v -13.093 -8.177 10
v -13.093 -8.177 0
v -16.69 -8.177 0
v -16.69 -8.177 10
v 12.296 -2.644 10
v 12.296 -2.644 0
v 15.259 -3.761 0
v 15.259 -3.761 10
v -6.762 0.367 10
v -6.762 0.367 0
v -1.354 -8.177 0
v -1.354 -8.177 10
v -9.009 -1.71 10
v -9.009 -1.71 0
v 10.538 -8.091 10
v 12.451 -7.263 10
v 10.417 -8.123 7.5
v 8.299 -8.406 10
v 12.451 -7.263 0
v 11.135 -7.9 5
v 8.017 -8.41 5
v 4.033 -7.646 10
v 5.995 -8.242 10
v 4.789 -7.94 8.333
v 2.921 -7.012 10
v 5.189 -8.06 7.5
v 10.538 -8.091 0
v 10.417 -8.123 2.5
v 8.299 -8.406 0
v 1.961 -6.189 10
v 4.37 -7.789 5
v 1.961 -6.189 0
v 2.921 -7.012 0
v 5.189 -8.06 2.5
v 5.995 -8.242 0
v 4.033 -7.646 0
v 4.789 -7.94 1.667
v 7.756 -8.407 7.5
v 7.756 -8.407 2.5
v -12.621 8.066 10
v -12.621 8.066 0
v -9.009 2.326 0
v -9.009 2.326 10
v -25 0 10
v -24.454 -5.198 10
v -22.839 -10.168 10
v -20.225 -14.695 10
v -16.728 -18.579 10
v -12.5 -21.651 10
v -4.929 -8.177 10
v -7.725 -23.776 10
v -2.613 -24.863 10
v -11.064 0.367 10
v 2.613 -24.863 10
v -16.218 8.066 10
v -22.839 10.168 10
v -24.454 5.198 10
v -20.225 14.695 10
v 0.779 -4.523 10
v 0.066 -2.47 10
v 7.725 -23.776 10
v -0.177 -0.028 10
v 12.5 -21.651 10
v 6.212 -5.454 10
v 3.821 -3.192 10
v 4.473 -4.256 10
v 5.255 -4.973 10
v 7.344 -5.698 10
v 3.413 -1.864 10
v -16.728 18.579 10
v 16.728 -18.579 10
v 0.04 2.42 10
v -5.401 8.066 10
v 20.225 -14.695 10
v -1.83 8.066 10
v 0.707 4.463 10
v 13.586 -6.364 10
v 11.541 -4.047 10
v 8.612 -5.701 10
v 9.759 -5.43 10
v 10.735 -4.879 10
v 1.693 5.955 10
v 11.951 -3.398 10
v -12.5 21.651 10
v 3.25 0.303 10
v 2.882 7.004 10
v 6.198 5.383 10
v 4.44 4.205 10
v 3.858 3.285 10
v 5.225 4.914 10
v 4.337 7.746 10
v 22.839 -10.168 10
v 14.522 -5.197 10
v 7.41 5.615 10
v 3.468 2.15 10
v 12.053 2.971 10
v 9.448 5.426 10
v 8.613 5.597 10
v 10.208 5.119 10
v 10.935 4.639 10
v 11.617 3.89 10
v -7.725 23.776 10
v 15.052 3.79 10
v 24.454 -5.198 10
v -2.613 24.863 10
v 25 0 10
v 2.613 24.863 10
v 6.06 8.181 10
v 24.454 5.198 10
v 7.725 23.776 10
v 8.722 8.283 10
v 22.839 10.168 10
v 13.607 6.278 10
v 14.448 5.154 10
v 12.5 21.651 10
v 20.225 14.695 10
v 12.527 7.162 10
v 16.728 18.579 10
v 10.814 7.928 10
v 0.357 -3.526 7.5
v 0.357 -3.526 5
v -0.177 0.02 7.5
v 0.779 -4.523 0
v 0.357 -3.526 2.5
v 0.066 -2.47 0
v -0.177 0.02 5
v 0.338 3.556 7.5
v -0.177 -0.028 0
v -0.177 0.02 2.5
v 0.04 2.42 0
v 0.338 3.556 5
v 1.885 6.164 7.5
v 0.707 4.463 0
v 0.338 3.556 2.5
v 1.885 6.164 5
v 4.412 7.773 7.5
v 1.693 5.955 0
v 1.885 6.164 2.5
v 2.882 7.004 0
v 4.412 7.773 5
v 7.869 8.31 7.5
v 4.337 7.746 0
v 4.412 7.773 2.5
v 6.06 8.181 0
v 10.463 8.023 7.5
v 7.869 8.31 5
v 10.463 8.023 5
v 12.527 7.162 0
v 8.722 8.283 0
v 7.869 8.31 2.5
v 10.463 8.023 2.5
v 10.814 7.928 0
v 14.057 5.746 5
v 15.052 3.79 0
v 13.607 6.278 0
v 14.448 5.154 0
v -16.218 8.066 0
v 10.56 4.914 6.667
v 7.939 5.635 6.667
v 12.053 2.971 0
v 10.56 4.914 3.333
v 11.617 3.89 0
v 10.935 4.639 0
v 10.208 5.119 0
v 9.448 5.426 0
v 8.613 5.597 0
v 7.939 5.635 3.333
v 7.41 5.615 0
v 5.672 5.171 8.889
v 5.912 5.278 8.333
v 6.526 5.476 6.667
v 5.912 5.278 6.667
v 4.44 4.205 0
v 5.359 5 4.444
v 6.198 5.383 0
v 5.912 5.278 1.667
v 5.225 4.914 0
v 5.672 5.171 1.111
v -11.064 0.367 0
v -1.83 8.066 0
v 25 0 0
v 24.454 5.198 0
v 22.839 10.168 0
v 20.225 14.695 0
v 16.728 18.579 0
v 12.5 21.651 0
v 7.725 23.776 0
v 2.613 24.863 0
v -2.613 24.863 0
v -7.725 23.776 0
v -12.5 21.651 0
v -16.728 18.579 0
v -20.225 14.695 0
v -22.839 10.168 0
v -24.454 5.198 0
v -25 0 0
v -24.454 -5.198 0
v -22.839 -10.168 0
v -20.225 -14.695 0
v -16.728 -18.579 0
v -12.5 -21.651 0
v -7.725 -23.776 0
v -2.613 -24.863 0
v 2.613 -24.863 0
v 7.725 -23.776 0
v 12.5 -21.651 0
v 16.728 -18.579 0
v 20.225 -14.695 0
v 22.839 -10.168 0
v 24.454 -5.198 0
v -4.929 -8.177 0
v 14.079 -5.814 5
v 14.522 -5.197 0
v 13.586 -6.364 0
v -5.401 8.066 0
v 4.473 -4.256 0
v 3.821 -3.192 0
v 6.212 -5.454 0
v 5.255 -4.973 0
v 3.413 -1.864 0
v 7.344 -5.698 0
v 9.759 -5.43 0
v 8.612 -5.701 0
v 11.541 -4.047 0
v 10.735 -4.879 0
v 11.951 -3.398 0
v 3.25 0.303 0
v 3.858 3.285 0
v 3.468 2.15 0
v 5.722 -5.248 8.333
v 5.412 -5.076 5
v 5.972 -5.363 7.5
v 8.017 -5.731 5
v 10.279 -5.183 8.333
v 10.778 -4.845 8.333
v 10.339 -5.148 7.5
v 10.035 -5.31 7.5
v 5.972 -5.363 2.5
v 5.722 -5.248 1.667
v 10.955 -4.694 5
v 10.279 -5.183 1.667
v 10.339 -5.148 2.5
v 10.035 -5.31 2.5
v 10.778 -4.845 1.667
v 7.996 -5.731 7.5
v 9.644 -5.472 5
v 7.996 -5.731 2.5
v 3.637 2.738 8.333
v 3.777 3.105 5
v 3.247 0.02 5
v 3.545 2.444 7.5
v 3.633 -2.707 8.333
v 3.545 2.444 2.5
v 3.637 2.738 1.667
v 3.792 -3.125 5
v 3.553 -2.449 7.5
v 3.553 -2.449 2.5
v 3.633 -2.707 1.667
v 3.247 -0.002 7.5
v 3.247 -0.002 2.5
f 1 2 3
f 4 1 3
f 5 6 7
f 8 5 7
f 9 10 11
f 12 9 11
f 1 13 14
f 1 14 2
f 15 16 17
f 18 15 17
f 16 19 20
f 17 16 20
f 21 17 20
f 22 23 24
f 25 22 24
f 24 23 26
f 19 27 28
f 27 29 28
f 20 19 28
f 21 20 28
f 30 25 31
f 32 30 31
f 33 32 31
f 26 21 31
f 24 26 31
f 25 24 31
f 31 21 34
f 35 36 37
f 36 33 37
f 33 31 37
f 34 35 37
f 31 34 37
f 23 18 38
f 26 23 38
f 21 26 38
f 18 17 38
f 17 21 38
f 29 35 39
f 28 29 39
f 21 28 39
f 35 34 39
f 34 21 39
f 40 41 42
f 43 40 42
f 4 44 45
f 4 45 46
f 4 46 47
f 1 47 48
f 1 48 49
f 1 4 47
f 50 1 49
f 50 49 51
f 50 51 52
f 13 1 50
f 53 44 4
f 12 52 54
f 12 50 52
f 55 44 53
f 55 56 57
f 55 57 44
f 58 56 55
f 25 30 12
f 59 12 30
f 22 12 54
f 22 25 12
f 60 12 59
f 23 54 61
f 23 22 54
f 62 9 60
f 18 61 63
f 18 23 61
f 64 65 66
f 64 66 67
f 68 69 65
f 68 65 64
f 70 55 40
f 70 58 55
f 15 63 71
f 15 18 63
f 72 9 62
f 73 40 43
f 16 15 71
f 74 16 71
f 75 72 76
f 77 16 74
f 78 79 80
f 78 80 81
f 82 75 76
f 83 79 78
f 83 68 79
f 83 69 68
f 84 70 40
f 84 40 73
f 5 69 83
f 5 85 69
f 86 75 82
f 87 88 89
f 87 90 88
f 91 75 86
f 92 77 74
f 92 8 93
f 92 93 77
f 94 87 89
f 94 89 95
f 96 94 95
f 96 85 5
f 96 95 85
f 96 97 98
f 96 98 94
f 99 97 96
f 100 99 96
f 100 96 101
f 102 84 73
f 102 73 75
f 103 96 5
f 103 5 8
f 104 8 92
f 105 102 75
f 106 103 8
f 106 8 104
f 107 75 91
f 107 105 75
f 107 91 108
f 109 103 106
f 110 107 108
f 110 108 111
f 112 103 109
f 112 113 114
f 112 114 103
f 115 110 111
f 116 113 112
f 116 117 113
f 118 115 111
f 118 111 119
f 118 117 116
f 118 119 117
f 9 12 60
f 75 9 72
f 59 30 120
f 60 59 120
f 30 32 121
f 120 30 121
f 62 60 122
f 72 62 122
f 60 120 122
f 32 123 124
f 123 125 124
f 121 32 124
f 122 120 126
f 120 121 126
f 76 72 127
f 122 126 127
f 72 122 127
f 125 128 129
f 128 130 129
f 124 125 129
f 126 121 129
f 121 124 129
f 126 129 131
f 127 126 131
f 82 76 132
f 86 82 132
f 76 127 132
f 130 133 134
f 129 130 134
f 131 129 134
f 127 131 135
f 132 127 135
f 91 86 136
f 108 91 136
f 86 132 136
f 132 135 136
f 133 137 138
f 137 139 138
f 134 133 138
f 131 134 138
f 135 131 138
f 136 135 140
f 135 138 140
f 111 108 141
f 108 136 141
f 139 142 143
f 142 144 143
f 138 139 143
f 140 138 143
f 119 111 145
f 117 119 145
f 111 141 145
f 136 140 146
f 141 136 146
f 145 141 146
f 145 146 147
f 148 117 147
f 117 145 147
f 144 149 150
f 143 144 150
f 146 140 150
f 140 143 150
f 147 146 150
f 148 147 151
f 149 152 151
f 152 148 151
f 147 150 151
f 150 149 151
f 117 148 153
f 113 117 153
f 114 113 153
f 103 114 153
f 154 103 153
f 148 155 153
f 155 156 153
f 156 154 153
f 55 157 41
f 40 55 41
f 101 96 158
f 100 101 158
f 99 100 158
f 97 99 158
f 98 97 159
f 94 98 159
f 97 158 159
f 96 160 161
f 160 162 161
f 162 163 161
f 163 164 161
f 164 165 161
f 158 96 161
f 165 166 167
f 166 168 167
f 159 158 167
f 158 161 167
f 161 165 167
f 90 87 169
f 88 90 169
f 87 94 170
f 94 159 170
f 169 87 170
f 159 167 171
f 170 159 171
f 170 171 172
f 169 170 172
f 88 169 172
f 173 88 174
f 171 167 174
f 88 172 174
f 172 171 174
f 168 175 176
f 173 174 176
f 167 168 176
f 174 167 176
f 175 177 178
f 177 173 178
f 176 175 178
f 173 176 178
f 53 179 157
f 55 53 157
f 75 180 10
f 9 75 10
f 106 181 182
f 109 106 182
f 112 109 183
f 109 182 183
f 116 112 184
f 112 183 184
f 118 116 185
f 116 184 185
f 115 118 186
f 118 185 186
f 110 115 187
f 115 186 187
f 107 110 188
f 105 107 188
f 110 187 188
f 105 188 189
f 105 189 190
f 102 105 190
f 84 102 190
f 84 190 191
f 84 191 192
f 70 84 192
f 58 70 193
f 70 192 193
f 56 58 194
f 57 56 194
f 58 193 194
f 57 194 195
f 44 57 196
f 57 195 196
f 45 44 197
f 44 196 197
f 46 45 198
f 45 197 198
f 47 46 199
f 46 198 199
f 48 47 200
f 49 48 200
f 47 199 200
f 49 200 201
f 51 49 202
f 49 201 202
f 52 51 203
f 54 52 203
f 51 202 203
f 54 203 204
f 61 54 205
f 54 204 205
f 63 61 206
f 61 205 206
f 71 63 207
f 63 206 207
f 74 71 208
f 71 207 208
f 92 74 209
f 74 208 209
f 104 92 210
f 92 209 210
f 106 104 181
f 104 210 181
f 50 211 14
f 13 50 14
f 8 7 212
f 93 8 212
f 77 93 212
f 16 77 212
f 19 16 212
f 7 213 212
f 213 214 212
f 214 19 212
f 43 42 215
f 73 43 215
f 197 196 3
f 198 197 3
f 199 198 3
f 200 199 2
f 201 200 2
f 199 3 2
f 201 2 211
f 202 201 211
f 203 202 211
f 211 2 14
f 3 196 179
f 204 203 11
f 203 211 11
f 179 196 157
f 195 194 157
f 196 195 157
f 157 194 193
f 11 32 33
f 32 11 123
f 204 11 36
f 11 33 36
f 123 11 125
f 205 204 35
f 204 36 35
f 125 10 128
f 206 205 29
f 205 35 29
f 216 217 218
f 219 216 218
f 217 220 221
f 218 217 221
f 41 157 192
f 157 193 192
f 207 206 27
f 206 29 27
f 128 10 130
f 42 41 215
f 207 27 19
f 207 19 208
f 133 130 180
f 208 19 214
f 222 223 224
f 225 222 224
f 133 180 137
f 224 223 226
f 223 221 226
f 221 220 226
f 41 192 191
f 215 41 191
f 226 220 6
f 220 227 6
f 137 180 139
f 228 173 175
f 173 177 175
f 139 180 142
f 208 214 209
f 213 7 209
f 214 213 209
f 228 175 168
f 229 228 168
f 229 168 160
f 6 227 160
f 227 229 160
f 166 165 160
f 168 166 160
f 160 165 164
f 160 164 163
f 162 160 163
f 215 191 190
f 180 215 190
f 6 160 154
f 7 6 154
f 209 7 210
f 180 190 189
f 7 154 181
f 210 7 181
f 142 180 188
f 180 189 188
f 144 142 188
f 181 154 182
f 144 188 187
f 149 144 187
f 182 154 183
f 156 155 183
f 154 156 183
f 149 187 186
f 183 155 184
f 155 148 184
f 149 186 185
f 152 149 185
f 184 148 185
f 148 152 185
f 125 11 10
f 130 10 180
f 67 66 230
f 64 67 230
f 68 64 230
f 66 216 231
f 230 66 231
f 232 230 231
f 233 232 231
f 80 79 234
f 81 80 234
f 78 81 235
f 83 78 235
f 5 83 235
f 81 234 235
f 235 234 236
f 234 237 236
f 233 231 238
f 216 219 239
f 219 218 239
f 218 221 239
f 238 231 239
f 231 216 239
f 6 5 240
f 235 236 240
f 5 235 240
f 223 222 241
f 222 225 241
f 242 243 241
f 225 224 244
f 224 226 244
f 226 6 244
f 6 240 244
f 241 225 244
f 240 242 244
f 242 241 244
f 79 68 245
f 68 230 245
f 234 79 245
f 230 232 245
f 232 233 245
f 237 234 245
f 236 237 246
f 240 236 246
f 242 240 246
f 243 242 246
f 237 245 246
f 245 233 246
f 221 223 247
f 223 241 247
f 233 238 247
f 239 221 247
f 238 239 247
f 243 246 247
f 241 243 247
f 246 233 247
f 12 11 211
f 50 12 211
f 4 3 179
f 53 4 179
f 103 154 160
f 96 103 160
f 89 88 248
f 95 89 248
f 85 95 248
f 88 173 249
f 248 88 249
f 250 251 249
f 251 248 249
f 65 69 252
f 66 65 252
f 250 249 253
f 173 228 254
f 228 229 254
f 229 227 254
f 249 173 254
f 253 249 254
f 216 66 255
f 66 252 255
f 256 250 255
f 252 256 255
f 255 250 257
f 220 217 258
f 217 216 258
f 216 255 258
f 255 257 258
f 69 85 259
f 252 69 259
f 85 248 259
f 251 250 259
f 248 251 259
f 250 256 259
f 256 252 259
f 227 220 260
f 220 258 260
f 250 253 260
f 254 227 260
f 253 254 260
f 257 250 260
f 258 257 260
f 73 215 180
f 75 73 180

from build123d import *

# Parameters (mm, degrees)
F0_R     = 25
F1_DEPTH = 10


with BuildPart() as f1:
    # F0 (on Top) → F1 (new body)
    with BuildSketch(Plane.XY):
        Circle(F0_R)
        Polygon((-1.3539496528, -8.1774380319), (-4.9288194444, -8.1774380319), (-9.0091145833, -1.7102071291), (-13.0930989583, -8.1774380319), (-16.6901041667, -8.1774380319), (-11.0640190972, 0.3668328015), (-16.2178819444, 8.0662685653), (-12.6208767361, 8.0662685653), (-9.0091145833, 2.3258171765), (-5.4010416667, 8.0662685653), (-1.8298611111, 8.0662685653), (-6.7623697917, 0.3668328015), align=None, mode=Mode.SUBTRACT)
        with BuildLine():
            add(Edge.make_bspline(
                [(4.4731987847, -4.2557800458), (5.6998697917, -5.7314744902), (8.0167100694, -5.7314744902)],
                knots=[0, 0, 0, 1, 1, 1], degree=2))
            add(Edge.make_bspline(
                [(8.0167100694, -5.7314744902), (11.0972222222, -5.7314744902), (12.2962239583, -2.6435838652)],
                knots=[0, 0, 0, 1, 1, 1], degree=2))
            Line((12.2962239583, -2.6435838652), (15.2586805556, -3.7614224069))
            add(Edge.make_bspline(
                [(15.2586805556, -3.7614224069), (14.3031684028, -6.1151550458), (12.451171875, -7.2625074763)],
                knots=[0, 0, 0, 1, 1, 1], degree=2))
            add(Edge.make_bspline(
                [(12.451171875, -7.2625074763), (10.5991753472, -8.4098599069), (8.0167100694, -8.4098599069)],
                knots=[0, 0, 0, 1, 1, 1], degree=2))
            add(Edge.make_bspline(
                [(8.0167100694, -8.4098599069), (4.0987413194, -8.4098599069), (1.9608289931, -6.188939768)],
                knots=[0, 0, 0, 1, 1, 1], degree=2))
            add(Edge.make_bspline(
                [(1.9608289931, -6.188939768), (-0.1770833333, -3.9680196291), (-0.1770833333, 0.020044607)],
                knots=[0, 0, 0, 1, 1, 1], degree=2))
            add(Edge.make_bspline(
                [(-0.1770833333, 0.020044607), (-0.1770833333, 4.0191765515), (1.8851996528, 6.1644673501)],
                knots=[0, 0, 0, 1, 1, 1], degree=2))
            add(Edge.make_bspline(
                [(1.8851996528, 6.1644673501), (3.9474826389, 8.3097581487), (7.869140625, 8.3097581487)],
                knots=[0, 0, 0, 1, 1, 1], degree=2))
            add(Edge.make_bspline(
                [(7.869140625, 8.3097581487), (10.7282986111, 8.3097581487), (12.5268012153, 7.1624057181)],
                knots=[0, 0, 0, 1, 1, 1], degree=2))
            add(Edge.make_bspline(
                [(12.5268012153, 7.1624057181), (14.3253038194, 6.0150532876), (15.0520833333, 3.7904439126)],
                knots=[0, 0, 0, 1, 1, 1], degree=2))
            Line((15.0520833333, 3.7904439126), (12.052734375, 2.9714334959))
            add(Edge.make_bspline(
                [(12.052734375, 2.9714334959), (11.6727430556, 4.1925706487), (10.5604383681, 4.9138163084)],
                knots=[0, 0, 0, 1, 1, 1], degree=2))
            add(Edge.make_bspline(
                [(10.5604383681, 4.9138163084), (9.4481336806, 5.6350619681), (7.9392361111, 5.6350619681)],
                knots=[0, 0, 0, 1, 1, 1], degree=2))
            add(Edge.make_bspline(
                [(7.9392361111, 5.6350619681), (5.6334635417, 5.6350619681), (4.4399956597, 4.2054829751)],
                knots=[0, 0, 0, 1, 1, 1], degree=2))
            add(Edge.make_bspline(
                [(4.4399956597, 4.2054829751), (3.2465277778, 2.775903982), (3.2465277778, 0.020044607)],
                knots=[0, 0, 0, 1, 1, 1], degree=2))
            add(Edge.make_bspline(
                [(3.2465277778, 0.020044607), (3.2465277778, -2.7800856013), (4.4731987847, -4.2557800458)],
                knots=[0, 0, 0, 1, 1, 1], degree=2))
        make_face(mode=Mode.SUBTRACT)
    extrude(amount=F1_DEPTH)


solid = f1.part
